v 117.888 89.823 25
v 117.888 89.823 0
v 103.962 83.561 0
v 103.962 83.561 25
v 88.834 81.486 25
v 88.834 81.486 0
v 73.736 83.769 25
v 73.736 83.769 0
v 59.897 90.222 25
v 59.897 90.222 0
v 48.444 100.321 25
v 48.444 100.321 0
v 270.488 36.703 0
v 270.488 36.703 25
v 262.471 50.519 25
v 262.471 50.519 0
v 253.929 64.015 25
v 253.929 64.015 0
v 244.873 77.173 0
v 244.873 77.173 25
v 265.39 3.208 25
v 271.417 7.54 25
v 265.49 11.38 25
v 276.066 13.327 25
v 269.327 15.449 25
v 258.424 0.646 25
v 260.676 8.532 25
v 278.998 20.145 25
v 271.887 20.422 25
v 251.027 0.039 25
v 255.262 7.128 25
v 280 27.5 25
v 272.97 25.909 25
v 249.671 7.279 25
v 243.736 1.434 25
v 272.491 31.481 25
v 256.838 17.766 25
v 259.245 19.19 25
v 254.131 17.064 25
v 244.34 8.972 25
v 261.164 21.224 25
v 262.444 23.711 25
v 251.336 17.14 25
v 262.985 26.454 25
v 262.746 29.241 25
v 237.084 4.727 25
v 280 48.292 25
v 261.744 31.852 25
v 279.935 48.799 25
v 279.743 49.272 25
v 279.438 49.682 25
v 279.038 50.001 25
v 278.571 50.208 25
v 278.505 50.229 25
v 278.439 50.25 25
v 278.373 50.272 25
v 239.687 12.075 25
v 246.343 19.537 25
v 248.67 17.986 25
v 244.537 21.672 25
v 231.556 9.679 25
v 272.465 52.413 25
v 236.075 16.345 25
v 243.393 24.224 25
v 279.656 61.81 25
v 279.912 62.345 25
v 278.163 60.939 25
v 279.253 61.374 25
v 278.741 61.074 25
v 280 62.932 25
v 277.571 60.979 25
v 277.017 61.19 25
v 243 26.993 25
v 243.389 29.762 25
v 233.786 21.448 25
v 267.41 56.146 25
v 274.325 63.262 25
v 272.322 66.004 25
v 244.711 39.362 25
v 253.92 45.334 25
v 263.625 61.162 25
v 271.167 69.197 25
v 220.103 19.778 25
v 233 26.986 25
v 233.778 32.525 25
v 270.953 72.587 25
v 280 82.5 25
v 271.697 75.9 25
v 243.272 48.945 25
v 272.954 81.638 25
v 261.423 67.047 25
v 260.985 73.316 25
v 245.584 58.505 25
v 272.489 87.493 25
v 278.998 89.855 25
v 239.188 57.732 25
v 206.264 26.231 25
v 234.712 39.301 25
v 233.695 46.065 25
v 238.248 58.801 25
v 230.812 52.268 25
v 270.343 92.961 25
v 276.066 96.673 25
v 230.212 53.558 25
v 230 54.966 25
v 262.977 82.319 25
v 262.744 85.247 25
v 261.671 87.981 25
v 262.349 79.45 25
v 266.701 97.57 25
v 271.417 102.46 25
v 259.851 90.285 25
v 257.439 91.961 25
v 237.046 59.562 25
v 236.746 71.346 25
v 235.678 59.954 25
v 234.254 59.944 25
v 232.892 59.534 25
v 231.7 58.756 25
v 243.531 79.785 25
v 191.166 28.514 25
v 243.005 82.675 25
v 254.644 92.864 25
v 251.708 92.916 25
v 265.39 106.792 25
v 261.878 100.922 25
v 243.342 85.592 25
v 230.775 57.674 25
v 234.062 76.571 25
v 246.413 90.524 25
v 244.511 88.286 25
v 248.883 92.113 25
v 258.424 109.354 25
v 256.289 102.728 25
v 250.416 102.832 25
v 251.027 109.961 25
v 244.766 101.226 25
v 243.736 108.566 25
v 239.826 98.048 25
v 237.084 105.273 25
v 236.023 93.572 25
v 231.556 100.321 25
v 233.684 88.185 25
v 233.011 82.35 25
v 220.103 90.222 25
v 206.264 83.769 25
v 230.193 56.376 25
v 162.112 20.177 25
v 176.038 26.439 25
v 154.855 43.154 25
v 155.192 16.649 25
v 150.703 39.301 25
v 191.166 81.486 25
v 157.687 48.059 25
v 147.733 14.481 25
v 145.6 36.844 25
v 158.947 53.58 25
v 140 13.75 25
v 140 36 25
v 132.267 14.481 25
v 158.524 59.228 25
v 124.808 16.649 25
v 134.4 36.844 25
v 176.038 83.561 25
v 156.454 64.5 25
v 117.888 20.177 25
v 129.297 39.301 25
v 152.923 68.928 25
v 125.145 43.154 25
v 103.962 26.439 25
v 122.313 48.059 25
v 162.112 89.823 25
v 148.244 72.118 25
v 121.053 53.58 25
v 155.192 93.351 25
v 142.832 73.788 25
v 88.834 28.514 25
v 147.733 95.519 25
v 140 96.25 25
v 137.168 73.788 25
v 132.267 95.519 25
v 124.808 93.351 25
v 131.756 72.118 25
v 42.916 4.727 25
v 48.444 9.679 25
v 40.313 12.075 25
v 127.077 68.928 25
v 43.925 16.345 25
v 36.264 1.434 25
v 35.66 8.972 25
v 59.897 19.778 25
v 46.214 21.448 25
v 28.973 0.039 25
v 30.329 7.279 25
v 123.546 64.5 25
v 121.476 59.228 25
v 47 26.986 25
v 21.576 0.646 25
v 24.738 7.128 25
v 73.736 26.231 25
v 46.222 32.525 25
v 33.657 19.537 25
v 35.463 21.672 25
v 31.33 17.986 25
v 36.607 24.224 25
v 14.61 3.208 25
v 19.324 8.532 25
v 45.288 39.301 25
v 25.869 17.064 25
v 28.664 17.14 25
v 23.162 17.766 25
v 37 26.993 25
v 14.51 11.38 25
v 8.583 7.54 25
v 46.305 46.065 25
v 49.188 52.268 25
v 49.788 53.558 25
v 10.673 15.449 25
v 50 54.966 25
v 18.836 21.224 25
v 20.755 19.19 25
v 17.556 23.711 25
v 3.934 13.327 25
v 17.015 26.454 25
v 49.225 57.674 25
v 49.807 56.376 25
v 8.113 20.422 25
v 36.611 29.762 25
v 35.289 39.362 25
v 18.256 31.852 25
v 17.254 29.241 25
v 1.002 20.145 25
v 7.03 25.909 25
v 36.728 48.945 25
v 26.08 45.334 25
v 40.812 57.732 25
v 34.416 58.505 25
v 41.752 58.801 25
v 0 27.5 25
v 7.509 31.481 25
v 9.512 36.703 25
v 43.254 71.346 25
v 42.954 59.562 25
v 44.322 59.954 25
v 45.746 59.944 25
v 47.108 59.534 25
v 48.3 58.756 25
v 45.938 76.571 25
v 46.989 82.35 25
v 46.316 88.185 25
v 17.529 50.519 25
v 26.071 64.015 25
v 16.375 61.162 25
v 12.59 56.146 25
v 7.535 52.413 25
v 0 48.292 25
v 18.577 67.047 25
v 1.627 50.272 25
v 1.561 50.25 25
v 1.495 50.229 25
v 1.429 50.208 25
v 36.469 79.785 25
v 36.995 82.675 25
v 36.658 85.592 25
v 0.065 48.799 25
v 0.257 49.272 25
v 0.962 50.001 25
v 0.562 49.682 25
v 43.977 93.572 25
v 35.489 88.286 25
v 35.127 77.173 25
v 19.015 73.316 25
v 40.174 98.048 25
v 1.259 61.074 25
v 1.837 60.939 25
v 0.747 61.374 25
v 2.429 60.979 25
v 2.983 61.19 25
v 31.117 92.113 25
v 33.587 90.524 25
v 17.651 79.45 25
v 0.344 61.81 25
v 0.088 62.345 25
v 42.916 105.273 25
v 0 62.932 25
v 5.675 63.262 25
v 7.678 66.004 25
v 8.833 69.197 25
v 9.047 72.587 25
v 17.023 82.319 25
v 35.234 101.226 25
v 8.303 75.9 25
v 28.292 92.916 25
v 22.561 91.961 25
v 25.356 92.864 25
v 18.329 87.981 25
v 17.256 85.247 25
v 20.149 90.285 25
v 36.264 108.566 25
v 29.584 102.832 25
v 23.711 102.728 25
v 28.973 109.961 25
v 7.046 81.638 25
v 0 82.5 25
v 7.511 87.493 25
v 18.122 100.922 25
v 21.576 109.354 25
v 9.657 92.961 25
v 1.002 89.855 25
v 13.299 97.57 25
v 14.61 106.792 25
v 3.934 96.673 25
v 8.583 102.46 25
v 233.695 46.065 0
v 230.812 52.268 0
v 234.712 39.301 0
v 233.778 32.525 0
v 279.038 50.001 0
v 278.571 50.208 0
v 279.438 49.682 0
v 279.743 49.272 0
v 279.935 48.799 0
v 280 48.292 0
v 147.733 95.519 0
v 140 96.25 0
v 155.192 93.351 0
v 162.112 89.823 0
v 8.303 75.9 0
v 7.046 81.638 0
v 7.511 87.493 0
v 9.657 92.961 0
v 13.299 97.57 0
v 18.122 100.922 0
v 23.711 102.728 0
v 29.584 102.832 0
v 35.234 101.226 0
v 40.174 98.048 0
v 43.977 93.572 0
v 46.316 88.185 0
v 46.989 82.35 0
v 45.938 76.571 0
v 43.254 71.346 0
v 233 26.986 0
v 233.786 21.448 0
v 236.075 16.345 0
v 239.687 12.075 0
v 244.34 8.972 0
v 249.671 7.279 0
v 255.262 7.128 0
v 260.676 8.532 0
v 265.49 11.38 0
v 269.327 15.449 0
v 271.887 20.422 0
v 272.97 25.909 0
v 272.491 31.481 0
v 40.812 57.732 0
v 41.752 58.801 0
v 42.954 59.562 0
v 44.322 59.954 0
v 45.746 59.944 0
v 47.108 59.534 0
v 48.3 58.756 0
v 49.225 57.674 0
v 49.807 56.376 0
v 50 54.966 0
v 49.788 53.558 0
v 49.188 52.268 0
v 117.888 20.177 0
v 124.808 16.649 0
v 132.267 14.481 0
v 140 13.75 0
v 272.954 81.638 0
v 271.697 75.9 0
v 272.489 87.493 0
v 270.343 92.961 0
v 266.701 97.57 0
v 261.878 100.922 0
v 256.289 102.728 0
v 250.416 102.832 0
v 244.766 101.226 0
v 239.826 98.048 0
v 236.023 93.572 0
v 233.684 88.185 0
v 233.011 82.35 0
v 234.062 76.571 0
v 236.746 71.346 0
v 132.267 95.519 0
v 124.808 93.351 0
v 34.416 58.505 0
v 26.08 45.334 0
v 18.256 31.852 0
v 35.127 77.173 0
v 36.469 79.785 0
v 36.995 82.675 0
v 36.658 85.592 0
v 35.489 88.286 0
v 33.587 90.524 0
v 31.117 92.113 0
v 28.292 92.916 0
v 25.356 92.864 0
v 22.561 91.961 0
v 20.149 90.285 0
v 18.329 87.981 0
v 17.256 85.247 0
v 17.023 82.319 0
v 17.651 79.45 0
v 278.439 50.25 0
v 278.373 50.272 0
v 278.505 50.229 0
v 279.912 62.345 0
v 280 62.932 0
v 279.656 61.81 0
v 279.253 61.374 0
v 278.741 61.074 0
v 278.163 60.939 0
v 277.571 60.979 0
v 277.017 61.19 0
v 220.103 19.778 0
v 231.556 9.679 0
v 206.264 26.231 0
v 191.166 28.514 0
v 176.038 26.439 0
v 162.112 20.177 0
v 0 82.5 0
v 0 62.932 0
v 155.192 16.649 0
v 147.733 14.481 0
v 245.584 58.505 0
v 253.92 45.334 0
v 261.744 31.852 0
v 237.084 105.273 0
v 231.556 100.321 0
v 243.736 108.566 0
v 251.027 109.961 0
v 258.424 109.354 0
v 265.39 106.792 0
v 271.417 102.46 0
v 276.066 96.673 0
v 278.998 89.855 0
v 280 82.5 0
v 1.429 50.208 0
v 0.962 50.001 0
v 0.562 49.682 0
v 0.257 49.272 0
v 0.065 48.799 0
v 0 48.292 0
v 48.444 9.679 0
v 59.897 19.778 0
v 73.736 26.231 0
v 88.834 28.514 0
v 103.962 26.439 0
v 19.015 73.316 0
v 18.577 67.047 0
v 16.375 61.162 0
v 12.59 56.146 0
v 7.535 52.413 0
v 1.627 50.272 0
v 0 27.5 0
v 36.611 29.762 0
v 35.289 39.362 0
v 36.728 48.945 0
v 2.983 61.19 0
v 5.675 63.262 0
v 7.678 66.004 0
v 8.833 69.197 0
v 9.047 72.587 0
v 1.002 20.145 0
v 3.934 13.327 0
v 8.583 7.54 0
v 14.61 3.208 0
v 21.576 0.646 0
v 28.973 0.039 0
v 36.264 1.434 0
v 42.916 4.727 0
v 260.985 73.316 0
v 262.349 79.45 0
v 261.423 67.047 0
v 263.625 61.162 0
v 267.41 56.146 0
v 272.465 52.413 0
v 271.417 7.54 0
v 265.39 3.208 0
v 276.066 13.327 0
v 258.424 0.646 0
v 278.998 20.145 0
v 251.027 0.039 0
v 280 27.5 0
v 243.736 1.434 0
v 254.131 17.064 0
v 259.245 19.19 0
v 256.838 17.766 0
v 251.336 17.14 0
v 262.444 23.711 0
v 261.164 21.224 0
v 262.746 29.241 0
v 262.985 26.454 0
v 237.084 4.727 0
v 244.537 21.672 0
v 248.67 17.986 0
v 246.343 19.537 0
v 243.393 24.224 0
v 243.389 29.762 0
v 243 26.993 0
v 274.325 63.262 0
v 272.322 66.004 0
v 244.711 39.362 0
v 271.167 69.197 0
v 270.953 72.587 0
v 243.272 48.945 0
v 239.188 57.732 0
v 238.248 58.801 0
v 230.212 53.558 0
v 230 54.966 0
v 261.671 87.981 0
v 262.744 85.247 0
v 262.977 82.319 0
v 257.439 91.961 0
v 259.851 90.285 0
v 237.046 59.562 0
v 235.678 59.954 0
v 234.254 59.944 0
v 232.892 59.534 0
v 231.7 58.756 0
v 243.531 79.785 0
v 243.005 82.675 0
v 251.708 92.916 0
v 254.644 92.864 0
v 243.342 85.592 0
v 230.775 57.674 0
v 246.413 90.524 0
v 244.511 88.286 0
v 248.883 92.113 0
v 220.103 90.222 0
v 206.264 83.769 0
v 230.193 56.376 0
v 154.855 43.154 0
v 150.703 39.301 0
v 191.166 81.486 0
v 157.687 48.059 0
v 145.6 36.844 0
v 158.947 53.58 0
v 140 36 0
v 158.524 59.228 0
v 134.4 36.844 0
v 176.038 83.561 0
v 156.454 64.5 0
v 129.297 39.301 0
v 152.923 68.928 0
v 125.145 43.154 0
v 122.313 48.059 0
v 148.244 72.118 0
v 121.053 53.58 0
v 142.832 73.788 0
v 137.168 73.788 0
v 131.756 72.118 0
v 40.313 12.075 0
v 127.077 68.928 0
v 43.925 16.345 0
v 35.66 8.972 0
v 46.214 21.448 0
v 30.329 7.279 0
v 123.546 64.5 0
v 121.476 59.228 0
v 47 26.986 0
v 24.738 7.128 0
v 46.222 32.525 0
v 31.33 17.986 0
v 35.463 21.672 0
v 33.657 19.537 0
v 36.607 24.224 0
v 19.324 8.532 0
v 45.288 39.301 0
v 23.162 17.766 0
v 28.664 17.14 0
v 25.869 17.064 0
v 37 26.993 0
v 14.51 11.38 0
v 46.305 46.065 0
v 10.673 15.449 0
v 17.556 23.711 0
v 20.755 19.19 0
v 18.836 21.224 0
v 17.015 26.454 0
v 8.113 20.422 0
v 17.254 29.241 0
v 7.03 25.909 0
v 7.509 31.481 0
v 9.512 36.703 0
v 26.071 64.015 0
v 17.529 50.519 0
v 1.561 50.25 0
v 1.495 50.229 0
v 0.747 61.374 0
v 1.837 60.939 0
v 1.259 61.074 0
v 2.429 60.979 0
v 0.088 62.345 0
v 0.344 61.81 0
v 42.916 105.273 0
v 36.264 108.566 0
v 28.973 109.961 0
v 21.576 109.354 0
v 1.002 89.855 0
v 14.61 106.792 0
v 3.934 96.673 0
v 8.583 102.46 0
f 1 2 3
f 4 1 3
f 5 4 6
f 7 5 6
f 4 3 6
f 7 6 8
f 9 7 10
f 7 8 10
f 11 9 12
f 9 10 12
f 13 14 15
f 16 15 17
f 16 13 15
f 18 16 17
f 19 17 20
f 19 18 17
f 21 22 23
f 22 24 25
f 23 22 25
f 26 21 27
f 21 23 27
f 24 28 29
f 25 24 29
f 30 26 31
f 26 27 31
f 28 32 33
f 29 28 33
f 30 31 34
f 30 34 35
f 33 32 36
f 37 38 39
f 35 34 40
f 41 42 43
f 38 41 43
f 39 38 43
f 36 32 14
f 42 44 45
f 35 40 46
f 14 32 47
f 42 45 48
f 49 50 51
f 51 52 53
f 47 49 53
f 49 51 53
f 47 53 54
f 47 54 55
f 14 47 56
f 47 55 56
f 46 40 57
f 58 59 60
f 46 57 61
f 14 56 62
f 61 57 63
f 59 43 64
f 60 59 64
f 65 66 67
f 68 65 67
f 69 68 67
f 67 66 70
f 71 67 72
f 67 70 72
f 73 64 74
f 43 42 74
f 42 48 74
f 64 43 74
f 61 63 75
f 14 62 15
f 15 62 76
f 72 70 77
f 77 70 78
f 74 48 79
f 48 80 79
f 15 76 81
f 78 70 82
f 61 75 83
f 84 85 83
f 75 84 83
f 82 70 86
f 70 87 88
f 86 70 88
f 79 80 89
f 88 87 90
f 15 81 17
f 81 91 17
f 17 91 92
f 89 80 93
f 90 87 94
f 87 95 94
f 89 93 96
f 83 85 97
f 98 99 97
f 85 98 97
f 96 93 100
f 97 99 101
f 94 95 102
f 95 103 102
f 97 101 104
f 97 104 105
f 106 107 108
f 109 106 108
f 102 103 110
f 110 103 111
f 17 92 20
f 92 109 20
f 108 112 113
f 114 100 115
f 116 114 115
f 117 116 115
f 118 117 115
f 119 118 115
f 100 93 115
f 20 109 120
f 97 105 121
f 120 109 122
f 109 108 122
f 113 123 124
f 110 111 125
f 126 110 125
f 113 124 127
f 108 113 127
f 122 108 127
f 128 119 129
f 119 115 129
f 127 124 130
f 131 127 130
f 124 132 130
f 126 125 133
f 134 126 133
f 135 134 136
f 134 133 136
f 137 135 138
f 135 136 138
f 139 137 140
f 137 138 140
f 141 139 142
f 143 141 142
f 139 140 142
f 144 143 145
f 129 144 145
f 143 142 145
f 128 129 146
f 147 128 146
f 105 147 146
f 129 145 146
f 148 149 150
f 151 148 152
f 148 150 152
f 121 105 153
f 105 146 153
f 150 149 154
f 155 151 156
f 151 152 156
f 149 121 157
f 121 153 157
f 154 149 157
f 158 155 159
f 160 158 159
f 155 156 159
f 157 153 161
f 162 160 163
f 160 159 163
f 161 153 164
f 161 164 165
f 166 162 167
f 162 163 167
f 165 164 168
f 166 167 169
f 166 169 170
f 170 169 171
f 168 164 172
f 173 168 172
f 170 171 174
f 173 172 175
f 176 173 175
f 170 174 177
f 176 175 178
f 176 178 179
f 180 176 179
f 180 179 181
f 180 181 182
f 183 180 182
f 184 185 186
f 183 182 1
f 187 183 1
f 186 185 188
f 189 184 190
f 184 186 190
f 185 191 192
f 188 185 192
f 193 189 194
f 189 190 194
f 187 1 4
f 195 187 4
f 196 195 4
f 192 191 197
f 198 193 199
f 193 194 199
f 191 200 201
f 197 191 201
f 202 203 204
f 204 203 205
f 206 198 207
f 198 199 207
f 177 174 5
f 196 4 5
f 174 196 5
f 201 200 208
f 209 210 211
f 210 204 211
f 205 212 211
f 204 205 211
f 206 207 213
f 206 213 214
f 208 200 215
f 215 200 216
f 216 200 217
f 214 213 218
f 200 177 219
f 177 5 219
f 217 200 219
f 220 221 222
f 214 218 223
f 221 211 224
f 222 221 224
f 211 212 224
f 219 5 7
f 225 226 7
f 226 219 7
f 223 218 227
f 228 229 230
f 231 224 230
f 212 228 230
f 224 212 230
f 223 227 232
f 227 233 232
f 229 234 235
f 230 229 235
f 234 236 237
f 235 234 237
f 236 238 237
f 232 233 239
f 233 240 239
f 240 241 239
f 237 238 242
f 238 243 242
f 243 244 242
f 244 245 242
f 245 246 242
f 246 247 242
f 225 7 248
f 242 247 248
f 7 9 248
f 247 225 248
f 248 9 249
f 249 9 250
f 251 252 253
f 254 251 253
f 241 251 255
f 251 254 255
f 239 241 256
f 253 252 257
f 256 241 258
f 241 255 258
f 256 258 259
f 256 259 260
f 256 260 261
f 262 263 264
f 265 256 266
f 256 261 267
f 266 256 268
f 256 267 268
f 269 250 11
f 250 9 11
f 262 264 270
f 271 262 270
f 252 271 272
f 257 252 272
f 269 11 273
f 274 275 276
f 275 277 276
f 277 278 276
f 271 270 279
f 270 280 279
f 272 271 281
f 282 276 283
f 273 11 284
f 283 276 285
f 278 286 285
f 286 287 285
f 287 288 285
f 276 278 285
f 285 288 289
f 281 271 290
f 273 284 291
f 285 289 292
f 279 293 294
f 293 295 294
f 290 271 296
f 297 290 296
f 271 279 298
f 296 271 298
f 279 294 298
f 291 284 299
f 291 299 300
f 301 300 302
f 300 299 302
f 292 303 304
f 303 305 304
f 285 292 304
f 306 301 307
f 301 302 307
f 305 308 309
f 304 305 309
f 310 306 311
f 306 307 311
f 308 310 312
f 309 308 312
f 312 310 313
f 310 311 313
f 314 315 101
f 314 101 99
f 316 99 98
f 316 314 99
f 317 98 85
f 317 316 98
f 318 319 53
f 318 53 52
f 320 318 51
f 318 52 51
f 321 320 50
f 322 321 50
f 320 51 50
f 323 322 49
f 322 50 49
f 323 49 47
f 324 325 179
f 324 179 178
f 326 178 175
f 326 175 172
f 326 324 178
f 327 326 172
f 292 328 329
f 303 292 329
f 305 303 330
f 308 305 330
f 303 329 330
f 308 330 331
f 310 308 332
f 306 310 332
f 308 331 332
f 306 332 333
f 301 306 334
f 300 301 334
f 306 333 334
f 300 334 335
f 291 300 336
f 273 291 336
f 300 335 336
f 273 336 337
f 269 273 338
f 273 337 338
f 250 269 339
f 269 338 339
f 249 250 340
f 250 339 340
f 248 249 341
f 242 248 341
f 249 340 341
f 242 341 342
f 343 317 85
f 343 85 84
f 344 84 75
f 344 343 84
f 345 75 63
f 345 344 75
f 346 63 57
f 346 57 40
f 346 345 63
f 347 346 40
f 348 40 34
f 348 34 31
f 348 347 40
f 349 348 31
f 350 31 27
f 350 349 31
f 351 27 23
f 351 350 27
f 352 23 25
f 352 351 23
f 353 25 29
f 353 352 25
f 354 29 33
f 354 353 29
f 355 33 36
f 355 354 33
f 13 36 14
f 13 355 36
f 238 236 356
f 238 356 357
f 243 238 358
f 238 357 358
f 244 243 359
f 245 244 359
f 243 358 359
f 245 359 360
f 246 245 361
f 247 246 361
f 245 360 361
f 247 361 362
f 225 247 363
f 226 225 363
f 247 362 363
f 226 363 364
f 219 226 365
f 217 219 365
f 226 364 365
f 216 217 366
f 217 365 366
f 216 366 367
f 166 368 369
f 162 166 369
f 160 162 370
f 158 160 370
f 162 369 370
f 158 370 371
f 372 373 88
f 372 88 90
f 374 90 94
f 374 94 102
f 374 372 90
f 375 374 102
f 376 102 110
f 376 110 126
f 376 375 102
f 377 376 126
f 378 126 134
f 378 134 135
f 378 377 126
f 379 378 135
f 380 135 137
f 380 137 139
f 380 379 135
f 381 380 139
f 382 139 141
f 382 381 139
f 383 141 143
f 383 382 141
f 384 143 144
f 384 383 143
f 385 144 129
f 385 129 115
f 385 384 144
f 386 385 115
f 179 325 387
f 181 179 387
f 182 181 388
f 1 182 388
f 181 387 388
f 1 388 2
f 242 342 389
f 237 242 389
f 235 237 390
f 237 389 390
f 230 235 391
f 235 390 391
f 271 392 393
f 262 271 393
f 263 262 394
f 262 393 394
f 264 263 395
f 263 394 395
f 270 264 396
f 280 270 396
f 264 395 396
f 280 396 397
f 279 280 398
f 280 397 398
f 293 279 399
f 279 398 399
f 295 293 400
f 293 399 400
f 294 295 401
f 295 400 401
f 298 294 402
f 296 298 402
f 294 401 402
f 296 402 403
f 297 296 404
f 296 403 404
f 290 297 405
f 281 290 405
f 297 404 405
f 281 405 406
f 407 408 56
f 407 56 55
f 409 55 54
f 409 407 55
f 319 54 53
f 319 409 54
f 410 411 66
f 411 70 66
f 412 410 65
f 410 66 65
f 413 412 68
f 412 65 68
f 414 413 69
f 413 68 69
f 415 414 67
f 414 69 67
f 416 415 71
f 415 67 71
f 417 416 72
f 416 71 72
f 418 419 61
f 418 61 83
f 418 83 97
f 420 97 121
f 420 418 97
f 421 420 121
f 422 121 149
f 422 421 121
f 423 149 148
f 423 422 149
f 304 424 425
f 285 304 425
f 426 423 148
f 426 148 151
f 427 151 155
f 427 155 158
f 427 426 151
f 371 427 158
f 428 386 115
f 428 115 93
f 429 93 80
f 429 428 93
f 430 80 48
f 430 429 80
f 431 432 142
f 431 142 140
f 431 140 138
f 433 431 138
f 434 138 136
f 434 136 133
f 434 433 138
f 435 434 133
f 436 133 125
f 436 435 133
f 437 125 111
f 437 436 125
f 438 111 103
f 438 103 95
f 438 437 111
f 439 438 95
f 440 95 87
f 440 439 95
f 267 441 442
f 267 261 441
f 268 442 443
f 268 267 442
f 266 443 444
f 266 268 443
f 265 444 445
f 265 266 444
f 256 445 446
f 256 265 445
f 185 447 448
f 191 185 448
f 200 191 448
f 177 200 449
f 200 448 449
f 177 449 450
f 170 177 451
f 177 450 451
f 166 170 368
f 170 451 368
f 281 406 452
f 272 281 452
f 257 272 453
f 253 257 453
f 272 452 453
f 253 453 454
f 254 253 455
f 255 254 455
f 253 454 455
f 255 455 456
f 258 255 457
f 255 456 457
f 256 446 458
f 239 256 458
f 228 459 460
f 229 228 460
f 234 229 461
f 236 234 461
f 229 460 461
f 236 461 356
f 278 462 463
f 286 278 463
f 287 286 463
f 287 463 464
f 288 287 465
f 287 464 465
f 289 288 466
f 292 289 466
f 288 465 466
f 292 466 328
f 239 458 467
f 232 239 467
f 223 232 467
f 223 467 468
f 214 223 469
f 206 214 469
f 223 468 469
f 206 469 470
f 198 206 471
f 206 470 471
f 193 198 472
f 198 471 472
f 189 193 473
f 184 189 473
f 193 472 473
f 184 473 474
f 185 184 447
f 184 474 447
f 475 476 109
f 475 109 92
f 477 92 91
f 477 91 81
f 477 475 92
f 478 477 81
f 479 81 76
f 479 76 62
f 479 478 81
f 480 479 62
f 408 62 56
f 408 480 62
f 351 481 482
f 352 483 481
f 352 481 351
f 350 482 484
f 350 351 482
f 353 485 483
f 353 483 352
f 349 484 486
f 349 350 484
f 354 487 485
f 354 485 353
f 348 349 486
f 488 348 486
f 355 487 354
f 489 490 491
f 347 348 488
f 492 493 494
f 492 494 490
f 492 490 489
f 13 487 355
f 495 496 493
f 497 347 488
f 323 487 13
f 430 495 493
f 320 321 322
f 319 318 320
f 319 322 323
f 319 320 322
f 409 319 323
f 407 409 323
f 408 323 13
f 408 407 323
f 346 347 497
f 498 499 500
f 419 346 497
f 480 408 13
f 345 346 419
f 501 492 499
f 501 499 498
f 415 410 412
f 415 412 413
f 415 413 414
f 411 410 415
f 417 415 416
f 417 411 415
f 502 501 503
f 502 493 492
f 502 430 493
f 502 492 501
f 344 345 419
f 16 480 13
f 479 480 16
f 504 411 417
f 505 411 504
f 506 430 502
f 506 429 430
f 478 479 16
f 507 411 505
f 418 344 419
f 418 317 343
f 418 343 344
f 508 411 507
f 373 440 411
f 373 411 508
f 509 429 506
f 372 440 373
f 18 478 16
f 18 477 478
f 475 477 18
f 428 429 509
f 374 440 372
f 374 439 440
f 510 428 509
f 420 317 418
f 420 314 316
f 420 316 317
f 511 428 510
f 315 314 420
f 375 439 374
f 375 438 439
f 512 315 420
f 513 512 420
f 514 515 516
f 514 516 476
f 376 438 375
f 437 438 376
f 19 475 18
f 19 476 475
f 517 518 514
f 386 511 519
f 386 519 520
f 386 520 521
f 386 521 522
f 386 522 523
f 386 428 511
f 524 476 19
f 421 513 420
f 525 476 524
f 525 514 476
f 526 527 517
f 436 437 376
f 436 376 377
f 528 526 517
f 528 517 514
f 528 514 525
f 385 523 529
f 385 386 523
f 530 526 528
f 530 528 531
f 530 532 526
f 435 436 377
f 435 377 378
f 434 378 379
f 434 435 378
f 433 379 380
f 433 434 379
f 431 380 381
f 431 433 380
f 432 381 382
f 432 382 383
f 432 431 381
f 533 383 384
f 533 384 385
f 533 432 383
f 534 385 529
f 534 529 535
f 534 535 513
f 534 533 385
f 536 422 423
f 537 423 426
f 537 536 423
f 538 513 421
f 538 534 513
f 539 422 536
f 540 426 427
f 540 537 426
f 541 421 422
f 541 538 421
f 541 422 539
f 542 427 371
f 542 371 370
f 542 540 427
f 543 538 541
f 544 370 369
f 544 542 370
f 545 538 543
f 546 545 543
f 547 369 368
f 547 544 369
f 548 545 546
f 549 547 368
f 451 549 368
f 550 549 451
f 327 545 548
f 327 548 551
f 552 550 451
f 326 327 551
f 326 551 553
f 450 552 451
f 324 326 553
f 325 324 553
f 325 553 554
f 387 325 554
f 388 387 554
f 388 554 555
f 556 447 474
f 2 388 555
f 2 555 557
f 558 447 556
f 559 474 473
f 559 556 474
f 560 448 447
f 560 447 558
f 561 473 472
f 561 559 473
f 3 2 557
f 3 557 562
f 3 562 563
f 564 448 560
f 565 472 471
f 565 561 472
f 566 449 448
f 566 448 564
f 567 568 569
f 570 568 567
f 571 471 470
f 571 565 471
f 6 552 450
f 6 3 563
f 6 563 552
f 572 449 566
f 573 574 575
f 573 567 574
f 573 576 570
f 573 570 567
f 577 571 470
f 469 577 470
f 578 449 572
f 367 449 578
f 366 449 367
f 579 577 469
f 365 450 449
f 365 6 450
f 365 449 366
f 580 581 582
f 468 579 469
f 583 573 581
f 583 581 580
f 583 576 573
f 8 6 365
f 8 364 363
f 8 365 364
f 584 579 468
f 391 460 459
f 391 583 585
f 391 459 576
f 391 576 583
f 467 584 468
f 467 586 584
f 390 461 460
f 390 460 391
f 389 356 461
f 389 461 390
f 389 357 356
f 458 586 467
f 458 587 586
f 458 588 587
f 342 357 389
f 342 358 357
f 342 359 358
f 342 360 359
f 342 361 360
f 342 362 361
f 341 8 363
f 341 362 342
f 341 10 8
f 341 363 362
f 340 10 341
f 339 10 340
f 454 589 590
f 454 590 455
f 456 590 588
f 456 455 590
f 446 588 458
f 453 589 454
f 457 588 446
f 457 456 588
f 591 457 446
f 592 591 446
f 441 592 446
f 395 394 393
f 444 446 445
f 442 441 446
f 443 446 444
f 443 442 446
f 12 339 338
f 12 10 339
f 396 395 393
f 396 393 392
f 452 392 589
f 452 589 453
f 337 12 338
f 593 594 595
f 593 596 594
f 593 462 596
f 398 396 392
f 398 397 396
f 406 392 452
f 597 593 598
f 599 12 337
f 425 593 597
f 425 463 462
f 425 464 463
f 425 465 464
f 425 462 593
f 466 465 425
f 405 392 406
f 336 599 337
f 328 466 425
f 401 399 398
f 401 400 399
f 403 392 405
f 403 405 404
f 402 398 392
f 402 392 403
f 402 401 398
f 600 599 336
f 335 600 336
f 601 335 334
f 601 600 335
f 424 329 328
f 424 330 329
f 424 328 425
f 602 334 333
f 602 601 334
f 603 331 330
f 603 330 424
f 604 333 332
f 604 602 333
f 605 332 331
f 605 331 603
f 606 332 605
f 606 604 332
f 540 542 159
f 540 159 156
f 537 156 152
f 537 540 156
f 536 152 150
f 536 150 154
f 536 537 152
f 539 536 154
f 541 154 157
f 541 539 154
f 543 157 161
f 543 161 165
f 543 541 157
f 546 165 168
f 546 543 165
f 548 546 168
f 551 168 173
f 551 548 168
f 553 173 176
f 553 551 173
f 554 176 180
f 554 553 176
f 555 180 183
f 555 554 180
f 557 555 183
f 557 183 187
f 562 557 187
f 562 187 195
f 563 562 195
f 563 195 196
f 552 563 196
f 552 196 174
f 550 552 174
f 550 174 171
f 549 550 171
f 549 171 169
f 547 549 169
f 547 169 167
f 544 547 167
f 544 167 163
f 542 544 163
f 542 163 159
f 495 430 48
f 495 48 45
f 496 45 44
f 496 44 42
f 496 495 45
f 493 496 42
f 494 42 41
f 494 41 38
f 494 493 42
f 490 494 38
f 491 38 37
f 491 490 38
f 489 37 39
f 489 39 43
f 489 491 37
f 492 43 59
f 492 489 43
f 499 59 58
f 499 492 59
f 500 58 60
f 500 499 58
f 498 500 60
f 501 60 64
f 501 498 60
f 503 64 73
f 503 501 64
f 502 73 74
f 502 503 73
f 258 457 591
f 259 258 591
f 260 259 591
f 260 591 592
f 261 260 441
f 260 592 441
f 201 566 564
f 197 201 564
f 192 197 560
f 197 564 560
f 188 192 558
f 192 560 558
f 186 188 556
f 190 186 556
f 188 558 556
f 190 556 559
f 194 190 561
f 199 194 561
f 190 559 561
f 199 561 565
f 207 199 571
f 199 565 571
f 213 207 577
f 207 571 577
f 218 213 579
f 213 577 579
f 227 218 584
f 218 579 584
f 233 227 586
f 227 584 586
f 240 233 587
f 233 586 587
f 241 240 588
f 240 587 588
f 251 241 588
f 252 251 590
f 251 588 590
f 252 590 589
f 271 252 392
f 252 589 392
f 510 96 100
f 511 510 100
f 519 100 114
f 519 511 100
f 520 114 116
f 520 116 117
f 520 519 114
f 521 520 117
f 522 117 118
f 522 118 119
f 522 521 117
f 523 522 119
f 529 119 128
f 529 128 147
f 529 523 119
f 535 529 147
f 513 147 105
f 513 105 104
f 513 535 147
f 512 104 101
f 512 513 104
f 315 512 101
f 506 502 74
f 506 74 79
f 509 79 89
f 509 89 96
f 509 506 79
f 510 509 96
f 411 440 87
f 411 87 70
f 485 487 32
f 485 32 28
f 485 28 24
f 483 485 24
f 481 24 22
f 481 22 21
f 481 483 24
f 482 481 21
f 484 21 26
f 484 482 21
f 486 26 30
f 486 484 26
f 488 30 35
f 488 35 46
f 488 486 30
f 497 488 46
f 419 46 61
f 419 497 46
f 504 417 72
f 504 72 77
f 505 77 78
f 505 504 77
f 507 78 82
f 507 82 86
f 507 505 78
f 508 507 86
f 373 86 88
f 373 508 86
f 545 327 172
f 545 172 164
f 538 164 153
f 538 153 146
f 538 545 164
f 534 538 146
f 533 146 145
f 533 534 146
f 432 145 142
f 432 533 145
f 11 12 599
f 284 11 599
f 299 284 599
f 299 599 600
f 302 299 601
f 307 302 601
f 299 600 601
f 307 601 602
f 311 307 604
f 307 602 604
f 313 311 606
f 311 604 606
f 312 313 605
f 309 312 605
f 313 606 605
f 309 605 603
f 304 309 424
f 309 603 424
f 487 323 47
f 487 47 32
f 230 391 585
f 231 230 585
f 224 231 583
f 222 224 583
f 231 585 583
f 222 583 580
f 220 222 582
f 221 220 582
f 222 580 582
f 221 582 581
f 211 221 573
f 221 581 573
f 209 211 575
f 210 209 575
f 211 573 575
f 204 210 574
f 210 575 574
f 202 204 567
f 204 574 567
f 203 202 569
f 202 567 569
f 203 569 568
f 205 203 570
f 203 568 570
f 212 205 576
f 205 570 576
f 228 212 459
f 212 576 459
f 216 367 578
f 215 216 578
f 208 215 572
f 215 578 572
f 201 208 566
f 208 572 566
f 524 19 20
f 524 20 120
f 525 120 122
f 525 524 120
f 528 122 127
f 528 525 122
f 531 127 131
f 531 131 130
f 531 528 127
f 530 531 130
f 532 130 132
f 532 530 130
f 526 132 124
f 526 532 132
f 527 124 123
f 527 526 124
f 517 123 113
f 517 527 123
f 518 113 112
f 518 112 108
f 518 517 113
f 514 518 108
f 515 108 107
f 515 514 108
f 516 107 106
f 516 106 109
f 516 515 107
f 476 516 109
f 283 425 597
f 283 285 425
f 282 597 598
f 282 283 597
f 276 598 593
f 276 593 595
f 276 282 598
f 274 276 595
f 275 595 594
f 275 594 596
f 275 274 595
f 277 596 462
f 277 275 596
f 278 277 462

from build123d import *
from build123d import SkipClean  # not in build123d's __all__

# Parameters (mm, degrees)
F1_DEPTH = 25
F3_R     = 2


with BuildPart() as f1:
    # F0 (on Top) → F1 (new body)
    with BuildSketch(Plane.XY):
        with BuildLine():
            ThreePointArc((140, 36), (121, 55), (140, 74))
            Line((140, 74), (140, 96.25))
            ThreePointArc((140, 96.25), (128.4866545127, 94.6106724973), (117.8884190329, 89.8229879123))
            ThreePointArc((117.8884190329, 89.8229879123), (81.203397703, 82.0861941742), (48.4444483171, 100.3207767702))
            ThreePointArc((48.4444483171, 100.3207767702), (18.0058525586, 108.309129477), (0, 82.5))
            Line((0, 82.5), (0, 60))
            ThreePointArc((0, 60), (7.7212902527, 66.0859717551), (8.3025905106, 75.9002198354))
            ThreePointArc((8.3025905106, 75.9002198354), (29.5840689899, 102.832362125), (43.2539034221, 71.3462184874))
            ThreePointArc((43.2539034221, 71.3462184874), (30.1846255305, 51.9598971701), (18.2558114501, 31.8517179024))
            ThreePointArc((18.2558114501, 31.8517179024), (25.8689742306, 17.0641668337), (36.6109152463, 29.7623012378))
            ThreePointArc((36.6109152463, 29.7623012378), (35.6652555644, 44.2047922692), (40.8124091235, 57.7320473369))
            ThreePointArc((40.8124091235, 57.7320473369), (47.7320473369, 59.1875908765), (49.1875908765, 52.2679526631))
            ThreePointArc((49.1875908765, 52.2679526631), (45.5543060113, 42.7193020271), (46.2218304926, 32.5246024755))
            ThreePointArc((46.2218304926, 32.5246024755), (24.7379484611, 7.1283336674), (9.5116229002, 36.7034358047))
            ThreePointArc((9.5116229002, 36.7034358047), (21.7349755999, 57.308113326), (35.1269517111, 77.1731092437))
            ThreePointArc((35.1269517111, 77.1731092437), (28.2920344949, 92.9161810625), (17.6512952553, 79.4501099177))
            ThreePointArc((17.6512952553, 79.4501099177), (16.3752735006, 61.1617226531), (1.6270466845, 50.2721337703))
            ThreePointArc((1.6270466845, 50.2721337703), (0.8248238755, 50.0685027046), (0, 50))
            Line((0, 50), (0, 27.5))
            ThreePointArc((0, 27.5), (18.0058525586, 1.690870523), (48.4444483171, 9.6792232298))
            ThreePointArc((48.4444483171, 9.6792232298), (81.203397703, 27.9138058258), (117.8884190329, 20.1770120877))
            ThreePointArc((117.8884190329, 20.1770120877), (128.4866545127, 15.3893275027), (140, 13.75))
            Line((140, 13.75), (140, 36))
        make_face()
    extrude(amount=F1_DEPTH)

    # F2: F1 across face


with BuildPart() as f1_1:
    add(f1.part, clean=False)
    with SkipClean():  # cleaning this boolean's faces spoils the solid; the shape is the same uncleaned
        add(f1.part.mirror(Plane(origin=(140, 85.125, 12.5), x_dir=(0, 1, 0), z_dir=(1, 0, 0))), clean=False)

    # F3
    f3_edges = [f1_1.edges().sort_by_distance(p)[0] for p in [
        (0, 60, 12.5),
        (0, 50, 12.5),
        (280, 60, 12.5),
        (280, 50, 12.5),
    ]]
    fillet(f3_edges, radius=F3_R)


solid = f1_1.part
